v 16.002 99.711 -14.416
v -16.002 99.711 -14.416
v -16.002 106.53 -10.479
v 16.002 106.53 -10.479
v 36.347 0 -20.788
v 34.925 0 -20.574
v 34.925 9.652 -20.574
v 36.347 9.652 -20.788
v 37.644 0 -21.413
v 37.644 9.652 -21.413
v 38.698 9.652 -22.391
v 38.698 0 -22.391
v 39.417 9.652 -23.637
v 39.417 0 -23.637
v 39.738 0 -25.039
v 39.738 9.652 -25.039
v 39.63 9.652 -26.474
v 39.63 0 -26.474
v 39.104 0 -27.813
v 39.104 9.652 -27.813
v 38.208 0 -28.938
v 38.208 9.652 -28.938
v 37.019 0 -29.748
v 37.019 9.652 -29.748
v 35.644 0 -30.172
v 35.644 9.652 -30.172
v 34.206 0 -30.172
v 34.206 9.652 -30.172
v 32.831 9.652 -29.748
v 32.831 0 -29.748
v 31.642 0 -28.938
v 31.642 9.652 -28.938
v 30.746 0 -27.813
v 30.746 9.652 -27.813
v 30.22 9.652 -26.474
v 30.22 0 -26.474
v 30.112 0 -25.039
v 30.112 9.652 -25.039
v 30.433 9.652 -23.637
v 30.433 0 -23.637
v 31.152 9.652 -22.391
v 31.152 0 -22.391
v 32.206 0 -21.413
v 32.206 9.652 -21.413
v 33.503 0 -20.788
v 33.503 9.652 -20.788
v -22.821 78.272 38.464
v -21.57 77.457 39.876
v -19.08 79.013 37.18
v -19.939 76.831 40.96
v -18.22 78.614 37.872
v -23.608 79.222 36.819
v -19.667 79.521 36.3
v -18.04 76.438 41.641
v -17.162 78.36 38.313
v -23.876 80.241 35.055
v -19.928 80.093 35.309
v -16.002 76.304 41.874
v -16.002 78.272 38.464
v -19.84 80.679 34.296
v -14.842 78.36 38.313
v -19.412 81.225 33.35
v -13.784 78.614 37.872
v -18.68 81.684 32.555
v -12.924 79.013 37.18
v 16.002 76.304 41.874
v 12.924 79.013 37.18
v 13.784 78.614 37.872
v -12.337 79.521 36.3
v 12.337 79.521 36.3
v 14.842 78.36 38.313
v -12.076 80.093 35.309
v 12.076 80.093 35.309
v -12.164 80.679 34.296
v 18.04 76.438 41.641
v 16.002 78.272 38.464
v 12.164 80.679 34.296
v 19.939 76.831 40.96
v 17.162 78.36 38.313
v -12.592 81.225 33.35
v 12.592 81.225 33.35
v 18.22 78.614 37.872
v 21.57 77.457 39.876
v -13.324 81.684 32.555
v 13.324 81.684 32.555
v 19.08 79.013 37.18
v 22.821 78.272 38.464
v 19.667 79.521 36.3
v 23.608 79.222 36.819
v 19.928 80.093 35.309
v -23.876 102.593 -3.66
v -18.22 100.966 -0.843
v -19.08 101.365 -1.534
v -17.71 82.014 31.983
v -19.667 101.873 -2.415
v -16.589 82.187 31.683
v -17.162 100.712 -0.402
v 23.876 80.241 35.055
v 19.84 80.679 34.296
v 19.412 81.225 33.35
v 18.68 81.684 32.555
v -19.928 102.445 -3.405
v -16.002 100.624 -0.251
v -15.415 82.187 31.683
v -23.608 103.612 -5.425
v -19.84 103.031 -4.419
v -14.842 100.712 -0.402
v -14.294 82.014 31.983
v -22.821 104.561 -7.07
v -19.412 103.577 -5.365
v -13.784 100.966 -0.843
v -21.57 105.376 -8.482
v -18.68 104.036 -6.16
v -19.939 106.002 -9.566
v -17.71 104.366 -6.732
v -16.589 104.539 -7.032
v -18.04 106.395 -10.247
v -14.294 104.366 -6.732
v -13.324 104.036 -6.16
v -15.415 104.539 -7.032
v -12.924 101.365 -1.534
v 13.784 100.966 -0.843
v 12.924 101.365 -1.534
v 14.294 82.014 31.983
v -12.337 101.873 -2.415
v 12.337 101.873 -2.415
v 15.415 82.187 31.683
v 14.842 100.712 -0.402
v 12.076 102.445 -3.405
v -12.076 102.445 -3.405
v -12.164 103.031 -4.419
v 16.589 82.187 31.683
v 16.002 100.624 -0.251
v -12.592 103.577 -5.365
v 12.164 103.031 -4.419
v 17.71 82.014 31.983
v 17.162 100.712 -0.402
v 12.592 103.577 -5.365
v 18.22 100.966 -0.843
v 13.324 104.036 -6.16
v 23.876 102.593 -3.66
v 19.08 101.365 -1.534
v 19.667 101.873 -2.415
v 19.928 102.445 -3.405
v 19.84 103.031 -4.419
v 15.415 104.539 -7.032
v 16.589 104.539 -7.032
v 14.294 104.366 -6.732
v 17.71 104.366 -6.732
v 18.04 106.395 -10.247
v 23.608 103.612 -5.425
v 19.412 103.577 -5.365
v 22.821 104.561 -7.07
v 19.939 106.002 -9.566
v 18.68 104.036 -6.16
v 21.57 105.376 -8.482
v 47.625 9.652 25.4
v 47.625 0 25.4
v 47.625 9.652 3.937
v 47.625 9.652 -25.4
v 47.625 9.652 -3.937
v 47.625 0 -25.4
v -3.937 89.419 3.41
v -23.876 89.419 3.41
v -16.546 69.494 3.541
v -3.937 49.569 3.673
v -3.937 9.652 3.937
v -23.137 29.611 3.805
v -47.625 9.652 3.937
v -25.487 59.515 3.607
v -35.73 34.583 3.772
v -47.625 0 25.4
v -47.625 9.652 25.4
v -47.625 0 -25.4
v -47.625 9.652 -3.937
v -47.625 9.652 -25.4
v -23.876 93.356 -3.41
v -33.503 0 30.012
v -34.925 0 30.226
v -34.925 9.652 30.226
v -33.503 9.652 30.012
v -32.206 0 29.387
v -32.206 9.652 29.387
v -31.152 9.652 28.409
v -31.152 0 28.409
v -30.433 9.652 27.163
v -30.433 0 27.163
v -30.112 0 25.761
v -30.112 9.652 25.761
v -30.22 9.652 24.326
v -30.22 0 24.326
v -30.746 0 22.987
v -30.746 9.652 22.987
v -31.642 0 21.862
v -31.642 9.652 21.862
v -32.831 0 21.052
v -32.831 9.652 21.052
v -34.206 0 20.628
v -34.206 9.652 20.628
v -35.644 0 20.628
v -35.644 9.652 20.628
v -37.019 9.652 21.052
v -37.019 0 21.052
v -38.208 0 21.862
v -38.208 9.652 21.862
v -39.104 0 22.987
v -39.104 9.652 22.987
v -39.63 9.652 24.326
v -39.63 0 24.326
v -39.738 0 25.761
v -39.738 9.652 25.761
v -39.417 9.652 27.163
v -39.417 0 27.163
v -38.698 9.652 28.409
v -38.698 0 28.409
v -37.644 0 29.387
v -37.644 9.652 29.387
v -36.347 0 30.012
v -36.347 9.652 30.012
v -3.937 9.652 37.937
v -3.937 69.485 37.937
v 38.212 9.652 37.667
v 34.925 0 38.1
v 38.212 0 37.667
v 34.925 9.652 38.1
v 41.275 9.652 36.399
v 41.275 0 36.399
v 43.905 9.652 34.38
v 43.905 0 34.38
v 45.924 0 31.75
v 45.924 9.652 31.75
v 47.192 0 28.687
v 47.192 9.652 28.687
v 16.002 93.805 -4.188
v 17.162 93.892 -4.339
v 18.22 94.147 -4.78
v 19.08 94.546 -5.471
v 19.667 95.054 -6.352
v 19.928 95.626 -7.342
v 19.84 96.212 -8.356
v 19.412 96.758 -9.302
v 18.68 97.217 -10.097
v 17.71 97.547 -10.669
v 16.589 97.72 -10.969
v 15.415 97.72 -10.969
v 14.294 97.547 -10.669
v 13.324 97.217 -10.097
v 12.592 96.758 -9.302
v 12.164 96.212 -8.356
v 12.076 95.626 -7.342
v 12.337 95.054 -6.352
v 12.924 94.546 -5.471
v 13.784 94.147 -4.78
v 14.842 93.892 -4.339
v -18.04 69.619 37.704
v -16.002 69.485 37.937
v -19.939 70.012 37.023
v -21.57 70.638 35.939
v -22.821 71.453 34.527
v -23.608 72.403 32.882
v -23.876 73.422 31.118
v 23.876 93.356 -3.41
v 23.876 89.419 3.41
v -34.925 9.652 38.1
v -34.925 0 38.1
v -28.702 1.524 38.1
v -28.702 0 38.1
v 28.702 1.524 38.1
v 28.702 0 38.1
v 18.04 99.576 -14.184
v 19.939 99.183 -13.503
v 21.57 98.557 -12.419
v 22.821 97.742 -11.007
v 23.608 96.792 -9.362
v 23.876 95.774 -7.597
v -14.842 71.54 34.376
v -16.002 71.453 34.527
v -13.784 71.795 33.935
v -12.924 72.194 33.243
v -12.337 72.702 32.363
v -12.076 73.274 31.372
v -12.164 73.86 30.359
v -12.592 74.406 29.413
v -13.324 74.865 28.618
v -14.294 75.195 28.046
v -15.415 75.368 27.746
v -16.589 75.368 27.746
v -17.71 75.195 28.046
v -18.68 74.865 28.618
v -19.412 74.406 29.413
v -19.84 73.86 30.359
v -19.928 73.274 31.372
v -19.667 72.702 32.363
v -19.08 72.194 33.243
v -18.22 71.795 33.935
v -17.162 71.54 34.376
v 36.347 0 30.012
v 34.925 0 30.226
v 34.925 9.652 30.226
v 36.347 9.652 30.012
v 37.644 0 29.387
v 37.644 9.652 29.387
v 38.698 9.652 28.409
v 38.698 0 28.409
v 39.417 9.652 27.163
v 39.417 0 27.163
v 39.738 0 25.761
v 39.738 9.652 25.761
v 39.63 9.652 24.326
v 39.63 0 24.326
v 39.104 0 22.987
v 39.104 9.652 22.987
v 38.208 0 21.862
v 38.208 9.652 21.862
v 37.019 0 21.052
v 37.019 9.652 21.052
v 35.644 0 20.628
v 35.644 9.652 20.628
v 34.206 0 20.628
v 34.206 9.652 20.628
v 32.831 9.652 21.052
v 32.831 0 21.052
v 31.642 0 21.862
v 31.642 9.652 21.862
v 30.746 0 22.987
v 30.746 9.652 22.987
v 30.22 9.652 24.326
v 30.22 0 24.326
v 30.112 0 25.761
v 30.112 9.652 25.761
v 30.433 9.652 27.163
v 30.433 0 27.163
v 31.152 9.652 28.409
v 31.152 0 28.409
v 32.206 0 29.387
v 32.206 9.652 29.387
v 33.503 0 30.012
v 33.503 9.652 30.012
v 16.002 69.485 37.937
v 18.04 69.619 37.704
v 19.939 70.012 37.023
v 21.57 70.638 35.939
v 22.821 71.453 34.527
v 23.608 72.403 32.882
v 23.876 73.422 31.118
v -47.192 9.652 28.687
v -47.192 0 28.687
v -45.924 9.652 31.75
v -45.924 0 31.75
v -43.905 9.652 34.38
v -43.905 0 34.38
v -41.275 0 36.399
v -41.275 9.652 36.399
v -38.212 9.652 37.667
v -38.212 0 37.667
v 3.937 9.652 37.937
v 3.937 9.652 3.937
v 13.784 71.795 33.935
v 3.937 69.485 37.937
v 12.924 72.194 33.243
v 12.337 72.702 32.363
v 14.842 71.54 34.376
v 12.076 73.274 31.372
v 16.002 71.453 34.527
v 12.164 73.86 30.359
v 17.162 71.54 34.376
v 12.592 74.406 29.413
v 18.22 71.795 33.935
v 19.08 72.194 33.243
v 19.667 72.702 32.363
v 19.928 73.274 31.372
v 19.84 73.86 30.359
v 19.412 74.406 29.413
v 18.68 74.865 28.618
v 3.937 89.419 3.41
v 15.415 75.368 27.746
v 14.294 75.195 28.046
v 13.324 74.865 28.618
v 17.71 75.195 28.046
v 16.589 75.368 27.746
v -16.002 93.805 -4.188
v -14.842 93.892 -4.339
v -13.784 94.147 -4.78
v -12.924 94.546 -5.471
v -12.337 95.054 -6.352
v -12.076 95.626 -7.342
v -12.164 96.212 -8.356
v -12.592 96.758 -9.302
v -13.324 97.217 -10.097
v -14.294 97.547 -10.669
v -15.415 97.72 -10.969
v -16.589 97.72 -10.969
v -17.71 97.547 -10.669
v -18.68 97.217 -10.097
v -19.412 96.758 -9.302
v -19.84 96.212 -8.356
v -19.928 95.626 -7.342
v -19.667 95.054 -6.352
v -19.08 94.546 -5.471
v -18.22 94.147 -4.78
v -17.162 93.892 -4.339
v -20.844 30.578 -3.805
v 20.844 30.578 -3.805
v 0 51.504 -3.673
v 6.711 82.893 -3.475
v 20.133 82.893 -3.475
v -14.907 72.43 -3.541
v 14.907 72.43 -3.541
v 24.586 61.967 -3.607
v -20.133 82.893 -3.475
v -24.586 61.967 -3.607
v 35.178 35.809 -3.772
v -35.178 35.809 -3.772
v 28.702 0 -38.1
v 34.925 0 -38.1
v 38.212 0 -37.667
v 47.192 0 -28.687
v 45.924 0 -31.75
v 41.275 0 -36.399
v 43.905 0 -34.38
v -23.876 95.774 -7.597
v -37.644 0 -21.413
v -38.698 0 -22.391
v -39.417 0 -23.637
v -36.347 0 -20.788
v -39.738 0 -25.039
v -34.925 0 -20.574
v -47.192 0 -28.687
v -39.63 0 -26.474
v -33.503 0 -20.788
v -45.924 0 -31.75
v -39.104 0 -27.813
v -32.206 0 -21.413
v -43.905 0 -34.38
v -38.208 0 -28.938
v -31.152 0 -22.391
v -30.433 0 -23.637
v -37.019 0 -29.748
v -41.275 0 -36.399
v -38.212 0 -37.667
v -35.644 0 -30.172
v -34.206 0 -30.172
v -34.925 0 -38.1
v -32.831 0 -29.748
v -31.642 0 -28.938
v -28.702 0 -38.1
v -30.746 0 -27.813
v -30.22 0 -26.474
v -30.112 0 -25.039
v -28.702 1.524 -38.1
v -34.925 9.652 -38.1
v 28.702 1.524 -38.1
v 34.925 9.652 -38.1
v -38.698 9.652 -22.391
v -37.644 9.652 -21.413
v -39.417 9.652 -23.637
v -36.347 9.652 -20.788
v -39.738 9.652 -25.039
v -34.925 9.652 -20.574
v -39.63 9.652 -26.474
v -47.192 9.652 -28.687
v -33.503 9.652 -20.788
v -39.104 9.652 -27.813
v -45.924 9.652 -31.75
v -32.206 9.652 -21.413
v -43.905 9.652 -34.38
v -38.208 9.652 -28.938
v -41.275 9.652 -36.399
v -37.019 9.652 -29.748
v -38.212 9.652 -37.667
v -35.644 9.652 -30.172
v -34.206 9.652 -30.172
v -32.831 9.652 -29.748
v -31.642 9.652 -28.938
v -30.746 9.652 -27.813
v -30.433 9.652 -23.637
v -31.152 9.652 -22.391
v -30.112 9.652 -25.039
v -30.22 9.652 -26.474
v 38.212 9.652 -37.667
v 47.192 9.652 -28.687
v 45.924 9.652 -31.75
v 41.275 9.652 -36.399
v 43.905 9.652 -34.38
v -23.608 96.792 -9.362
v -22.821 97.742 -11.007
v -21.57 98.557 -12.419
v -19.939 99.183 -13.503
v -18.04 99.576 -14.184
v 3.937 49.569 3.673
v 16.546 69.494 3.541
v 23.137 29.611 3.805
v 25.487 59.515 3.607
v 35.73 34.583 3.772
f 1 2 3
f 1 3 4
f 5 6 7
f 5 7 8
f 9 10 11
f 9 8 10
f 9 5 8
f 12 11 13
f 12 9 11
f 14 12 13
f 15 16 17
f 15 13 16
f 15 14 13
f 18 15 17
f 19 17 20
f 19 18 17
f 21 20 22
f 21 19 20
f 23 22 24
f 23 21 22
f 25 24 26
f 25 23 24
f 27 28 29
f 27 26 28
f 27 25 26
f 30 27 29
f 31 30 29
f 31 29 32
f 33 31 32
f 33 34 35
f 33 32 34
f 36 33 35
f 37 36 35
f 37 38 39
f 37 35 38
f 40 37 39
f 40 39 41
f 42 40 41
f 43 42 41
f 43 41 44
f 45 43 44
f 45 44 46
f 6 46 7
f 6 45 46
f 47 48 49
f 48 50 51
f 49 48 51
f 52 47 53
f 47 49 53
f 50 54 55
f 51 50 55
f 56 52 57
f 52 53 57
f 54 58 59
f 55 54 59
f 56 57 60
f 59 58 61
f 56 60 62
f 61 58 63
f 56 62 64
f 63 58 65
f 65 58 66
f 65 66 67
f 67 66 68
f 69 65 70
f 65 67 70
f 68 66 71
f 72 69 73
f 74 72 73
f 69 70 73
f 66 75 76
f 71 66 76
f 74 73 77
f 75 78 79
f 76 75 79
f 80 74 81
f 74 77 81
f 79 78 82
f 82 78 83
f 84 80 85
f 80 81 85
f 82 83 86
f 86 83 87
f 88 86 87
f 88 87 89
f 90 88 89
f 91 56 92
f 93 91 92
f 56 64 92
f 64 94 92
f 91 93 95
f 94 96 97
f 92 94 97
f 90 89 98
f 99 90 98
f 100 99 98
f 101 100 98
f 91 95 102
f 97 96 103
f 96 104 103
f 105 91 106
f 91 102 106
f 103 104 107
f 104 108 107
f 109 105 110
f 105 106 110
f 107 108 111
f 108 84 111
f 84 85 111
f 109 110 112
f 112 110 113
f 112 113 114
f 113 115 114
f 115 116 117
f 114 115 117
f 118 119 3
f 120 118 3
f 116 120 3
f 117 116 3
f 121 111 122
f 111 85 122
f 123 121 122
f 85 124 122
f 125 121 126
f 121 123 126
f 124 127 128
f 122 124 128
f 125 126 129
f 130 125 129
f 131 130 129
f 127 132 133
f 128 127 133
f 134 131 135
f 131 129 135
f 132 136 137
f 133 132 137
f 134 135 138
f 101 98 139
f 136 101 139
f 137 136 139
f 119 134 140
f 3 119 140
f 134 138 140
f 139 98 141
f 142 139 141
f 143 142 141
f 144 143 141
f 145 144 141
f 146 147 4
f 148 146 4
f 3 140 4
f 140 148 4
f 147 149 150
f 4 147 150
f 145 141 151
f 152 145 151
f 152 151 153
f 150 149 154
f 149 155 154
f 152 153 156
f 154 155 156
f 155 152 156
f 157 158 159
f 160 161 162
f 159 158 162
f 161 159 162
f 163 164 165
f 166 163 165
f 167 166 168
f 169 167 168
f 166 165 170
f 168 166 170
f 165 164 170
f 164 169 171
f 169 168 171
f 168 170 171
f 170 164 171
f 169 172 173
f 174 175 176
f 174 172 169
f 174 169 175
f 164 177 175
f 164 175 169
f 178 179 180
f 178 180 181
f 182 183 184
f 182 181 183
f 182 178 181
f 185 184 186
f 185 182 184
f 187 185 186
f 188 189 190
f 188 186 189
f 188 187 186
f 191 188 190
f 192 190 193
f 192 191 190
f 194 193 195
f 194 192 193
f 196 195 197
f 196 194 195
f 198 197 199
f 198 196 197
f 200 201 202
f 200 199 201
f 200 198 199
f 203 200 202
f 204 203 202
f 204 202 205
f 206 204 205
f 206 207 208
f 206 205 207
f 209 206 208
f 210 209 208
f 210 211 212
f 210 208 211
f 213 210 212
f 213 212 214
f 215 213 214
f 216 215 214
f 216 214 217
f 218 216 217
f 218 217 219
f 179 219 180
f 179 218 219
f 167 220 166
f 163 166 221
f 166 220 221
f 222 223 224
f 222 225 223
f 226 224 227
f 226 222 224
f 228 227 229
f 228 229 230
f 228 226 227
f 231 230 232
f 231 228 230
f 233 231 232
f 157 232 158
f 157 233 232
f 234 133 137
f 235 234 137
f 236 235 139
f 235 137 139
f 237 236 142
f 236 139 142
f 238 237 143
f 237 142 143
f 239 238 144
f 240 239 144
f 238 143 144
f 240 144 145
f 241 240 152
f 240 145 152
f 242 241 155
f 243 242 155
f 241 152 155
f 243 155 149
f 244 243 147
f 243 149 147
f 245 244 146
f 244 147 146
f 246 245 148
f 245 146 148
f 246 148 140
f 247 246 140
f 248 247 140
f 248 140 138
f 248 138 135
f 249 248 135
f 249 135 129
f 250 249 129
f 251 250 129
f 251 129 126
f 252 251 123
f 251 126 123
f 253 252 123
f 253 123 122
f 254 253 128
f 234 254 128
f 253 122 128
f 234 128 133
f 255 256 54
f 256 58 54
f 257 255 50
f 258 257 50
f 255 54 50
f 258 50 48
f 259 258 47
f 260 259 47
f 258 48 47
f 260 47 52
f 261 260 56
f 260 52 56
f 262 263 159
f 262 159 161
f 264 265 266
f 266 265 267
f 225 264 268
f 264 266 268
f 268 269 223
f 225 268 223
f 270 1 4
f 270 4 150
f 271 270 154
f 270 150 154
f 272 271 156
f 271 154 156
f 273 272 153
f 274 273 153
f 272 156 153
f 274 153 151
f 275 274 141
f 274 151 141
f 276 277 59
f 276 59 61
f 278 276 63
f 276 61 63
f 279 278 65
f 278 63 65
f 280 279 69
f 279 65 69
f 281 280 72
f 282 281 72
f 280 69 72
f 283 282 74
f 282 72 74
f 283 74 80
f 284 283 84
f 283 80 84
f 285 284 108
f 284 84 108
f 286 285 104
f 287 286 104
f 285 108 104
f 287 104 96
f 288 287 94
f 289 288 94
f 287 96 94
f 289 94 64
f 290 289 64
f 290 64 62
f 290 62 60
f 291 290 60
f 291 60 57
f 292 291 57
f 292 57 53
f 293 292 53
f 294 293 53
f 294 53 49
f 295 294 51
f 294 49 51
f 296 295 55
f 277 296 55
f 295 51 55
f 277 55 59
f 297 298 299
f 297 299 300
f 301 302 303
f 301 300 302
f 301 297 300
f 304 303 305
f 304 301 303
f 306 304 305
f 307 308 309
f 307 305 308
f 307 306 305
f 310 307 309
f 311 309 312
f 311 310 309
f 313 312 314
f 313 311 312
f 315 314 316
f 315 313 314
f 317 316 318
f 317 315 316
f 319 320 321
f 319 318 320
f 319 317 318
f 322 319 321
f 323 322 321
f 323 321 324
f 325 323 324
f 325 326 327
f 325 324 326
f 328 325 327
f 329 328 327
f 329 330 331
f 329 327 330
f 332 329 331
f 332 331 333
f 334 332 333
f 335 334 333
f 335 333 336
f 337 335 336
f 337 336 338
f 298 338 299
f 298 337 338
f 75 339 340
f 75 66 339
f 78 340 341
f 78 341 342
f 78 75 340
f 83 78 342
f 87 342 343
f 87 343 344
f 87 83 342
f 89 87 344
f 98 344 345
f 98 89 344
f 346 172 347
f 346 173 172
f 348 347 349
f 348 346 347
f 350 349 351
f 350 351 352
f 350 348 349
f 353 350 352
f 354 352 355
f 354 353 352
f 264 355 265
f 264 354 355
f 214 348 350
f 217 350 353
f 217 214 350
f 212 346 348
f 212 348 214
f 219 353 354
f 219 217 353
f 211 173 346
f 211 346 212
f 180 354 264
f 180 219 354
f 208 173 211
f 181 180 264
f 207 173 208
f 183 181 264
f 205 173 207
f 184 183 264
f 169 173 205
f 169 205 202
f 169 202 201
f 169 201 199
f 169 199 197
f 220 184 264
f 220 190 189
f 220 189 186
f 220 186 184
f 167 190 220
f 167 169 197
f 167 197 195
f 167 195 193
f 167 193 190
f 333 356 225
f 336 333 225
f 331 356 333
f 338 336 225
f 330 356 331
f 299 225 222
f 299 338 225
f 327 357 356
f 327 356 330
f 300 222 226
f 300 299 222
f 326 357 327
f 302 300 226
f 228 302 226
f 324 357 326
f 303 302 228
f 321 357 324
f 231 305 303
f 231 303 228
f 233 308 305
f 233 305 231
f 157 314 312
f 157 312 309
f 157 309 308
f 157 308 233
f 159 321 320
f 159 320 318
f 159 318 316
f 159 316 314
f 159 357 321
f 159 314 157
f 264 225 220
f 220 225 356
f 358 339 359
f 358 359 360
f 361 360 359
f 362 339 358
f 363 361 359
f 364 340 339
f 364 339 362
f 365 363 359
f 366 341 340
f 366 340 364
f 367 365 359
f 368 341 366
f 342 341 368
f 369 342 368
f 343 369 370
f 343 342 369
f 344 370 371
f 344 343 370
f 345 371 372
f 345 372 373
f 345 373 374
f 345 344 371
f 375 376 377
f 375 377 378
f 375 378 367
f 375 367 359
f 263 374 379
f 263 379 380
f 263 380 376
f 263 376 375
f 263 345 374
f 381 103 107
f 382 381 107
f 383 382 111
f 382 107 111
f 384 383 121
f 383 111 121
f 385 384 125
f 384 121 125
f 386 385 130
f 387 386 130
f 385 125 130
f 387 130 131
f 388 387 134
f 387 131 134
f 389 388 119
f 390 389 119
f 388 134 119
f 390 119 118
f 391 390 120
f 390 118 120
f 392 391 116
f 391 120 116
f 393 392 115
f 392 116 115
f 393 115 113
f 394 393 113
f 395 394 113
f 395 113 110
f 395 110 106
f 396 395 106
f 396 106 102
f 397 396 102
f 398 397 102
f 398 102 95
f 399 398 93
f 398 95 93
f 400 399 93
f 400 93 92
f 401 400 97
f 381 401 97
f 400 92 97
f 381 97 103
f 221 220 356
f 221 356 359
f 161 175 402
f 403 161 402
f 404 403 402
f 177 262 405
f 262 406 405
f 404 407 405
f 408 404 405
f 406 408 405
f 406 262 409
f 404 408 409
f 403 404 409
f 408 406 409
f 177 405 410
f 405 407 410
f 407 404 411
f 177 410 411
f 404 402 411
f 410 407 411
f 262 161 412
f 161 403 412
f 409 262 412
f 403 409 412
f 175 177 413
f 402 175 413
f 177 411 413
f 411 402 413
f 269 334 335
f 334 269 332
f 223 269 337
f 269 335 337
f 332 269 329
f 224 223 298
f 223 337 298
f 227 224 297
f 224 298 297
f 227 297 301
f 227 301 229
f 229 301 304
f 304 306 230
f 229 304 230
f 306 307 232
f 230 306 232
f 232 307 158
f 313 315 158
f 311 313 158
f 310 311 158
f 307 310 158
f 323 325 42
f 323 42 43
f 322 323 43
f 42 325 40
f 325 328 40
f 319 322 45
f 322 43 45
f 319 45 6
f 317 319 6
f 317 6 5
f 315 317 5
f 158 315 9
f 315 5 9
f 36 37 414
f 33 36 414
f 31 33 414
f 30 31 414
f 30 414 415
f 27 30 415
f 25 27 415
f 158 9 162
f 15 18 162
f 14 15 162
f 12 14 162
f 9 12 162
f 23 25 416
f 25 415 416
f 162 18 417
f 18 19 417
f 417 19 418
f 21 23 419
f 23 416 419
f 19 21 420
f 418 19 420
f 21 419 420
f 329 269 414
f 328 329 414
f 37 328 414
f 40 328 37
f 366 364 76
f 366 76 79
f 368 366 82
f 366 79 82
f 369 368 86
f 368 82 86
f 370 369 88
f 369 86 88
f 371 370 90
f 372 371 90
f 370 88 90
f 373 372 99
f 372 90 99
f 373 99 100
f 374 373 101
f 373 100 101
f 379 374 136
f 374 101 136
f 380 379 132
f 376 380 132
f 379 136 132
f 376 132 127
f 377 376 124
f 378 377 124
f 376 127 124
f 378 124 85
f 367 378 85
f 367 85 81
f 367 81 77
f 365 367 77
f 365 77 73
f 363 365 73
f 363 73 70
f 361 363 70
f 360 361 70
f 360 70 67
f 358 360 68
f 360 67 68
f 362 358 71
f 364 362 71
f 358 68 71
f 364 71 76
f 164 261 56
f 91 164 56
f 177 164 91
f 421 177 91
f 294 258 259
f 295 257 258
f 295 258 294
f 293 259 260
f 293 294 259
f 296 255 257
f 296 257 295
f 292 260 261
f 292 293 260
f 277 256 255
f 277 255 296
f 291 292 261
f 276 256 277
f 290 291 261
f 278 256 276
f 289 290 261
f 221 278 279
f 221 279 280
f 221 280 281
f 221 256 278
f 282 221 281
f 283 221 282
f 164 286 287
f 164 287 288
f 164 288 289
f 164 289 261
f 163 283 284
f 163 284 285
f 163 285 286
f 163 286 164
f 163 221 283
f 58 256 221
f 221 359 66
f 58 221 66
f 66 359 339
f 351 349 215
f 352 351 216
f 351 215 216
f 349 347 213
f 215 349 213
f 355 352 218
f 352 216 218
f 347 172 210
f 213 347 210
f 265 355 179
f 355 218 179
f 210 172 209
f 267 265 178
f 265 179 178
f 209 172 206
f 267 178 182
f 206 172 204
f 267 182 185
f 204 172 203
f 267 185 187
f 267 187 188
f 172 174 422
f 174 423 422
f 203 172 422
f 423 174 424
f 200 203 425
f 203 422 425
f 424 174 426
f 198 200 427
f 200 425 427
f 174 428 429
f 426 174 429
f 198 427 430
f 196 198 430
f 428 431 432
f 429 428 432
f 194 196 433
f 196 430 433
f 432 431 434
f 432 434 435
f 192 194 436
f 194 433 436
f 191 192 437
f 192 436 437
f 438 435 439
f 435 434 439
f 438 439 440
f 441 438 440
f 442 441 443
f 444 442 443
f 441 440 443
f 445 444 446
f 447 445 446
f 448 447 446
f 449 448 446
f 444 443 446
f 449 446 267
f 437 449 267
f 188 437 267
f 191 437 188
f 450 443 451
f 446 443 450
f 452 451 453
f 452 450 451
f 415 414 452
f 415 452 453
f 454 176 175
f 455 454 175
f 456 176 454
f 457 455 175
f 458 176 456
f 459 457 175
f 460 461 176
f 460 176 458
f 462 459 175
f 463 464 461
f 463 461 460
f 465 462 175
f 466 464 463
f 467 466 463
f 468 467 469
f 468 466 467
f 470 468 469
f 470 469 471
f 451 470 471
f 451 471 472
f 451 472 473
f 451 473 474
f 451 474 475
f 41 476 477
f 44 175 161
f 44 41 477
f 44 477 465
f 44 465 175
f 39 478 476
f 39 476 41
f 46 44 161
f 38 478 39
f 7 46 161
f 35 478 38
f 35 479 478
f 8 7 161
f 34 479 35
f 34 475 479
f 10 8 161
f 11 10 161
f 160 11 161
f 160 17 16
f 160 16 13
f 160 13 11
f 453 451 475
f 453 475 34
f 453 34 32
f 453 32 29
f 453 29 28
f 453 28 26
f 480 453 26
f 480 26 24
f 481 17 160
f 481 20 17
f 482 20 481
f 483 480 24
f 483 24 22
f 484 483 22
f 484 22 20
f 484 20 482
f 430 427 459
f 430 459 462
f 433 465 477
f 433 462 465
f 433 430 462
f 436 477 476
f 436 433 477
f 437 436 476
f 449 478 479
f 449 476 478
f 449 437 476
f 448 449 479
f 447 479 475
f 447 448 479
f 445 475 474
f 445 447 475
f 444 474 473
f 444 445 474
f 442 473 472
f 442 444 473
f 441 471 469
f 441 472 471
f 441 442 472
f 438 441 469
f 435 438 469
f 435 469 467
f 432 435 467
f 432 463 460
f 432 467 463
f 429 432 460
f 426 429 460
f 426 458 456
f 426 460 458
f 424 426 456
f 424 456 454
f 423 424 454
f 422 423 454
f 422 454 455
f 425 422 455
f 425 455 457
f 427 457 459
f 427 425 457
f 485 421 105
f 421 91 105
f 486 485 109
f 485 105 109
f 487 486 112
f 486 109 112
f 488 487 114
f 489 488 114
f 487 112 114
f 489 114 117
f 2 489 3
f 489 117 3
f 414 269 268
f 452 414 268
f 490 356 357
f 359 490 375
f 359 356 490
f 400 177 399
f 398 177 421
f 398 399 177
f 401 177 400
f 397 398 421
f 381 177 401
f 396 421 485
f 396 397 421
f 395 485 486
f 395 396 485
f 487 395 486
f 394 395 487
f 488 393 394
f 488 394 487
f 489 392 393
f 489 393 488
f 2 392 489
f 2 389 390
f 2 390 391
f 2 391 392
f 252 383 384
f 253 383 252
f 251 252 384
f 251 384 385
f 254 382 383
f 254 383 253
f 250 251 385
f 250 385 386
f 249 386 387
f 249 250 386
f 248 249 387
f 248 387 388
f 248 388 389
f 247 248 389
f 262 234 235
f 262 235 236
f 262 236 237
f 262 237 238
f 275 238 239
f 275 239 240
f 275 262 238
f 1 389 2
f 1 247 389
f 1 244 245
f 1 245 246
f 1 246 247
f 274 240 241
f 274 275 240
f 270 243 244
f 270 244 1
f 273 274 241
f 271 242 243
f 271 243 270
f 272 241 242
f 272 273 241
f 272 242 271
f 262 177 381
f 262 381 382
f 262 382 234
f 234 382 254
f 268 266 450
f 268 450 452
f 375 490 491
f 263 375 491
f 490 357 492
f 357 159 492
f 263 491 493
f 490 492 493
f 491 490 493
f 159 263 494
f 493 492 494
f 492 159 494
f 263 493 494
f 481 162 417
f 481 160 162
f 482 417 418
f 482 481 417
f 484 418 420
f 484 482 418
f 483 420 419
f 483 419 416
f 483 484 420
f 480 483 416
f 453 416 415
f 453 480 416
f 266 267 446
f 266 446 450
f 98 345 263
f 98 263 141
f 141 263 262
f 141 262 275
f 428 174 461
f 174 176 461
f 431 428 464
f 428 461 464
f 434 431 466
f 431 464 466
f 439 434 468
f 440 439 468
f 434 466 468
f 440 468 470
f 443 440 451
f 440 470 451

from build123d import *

# Parameters (mm, degrees)
SKETCH1_W               = 95.25
SKETCH1_H               = 76.2
BOSS_EXTRUDE1_DEPTH     = 9.652
FILLET1_R               = 12.7
CUT_EXTRUDE1_DEPTH      = 62.74877917
CUT_EXTRUDE1_DEPTH_BACK = 62.74877917
SKETCH2_R               = 4.826
SKETCH3_W               = 57.404
SKETCH3_H               = 3.048
CUT_EXTRUDE2_DEPTH      = 91.375559356
SKETCH5_W               = 60.452
SKETCH5_H               = 47.752
BOSS_EXTRUDE2_DEPTH     = 7.874
FILLET2_R               = 7.874
SKETCH6_R               = 3.937
CUT_EXTRUDE3_DEPTH      = 7.874
RIB1_REACH              = 125.976
SKETCH10_WALL_W         = 309.953649084
SKETCH10_WALL_H         = 7.874


with BuildPart() as part:
    # Sketch1 → Boss-Extrude1 (new body)
    with BuildSketch(Plane(origin=(0, 0, 0), x_dir=(1, 0, 0), z_dir=(0, 1, 0))):
        Rectangle(SKETCH1_W, SKETCH1_H)
    extrude(amount=BOSS_EXTRUDE1_DEPTH)

    # Fillet1
    fillet1_edges = [part.edges().sort_by_distance(p)[0] for p in [
        (47.625, 4.826, 38.1),
        (-47.625, 4.826, 38.1),
        (-47.625, 4.826, -38.1),
        (47.625, 4.826, -38.1),
    ]]
    fillet(fillet1_edges, radius=FILLET1_R)

    # Sketch2 → Cut-Extrude1 (cut, two sides: drawn at the far end of the back side and taken through both)
    with BuildSketch(Plane(origin=(0, 9.652, 0), x_dir=(1, 0, 0), z_dir=(0, 1, 0)).offset(-CUT_EXTRUDE1_DEPTH_BACK)):
        with Locations(Location((-34.925, -25.4, 0), (0, 0, 270))):
            Circle(SKETCH2_R)
        with Locations(Location((-34.925, 25.4, 0), (0, 0, 270))):
            Circle(SKETCH2_R)
        with Locations(Location((34.925, 25.4, 0), (0, 0, 270))):
            Circle(SKETCH2_R)
        with Locations(Location((34.925, -25.4, 0), (0, 0, 270))):
            Circle(SKETCH2_R)
    extrude(amount=CUT_EXTRUDE1_DEPTH + CUT_EXTRUDE1_DEPTH_BACK, mode=Mode.SUBTRACT)

    # Sketch3 → Cut-Extrude2 (cut, through all)
    with BuildSketch(Plane.XY.offset(38.1)):
        Rectangle(SKETCH3_W, SKETCH3_H)
    extrude(amount=-CUT_EXTRUDE2_DEPTH, mode=Mode.SUBTRACT)



with BuildPart() as body_2:
    # Sketch5 → Boss-Extrude2 (new body)
    with BuildSketch(Plane(origin=(0, 68.540427062, 39.571834015), x_dir=(0, 0.4999999999999976, -0.86602540378444), z_dir=(0, -0.8660254037844402, -0.4999999999999977))):
        with Locations((32.114183863, 0)):
            Rectangle(SKETCH5_W, SKETCH5_H)
    extrude(amount=-BOSS_EXTRUDE2_DEPTH)

    # Fillet2
    fillet2_edges = [body_2.edges().sort_by_distance(p)[0] for p in [
        (-23.876, 103.120061008, -12.447848887),
        (-23.876, 72.894061008, 39.905118823),
        (23.876, 72.894061008, 39.905118823),
        (23.876, 103.120061008, -12.447848887),
    ]]
    fillet(fillet2_edges, radius=FILLET2_R)

    # Sketch6 → Cut-Extrude3 (cut)
    with BuildSketch(Plane(origin=(0, 75.359511091, 43.508834015), x_dir=(1, 0, 0), z_dir=(0, 0.86602540378444, 0.49999999999999784))):
        with Locations(Location((-16.002, 9.762183863, 0), (0, 0, 270))):
            Circle(SKETCH6_R)
        with Locations(Location((16.002, 9.762183863, 0), (0, 0, 270))):
            Circle(SKETCH6_R)
        with Locations(Location((16.002, 54.466183863, 0), (0, 0, 270))):
            Circle(SKETCH6_R)
        with Locations(Location((-16.002, 54.466183863, 0), (0, 0, 270))):
            Circle(SKETCH6_R)
    extrude(amount=-CUT_EXTRUDE3_DEPTH, mode=Mode.SUBTRACT)


with BuildPart() as part_1:
    add(part.part)

    add(body_2.part)  # Loft1 merges body 2
    # Sketch9 → Loft1 section 0
    with BuildSketch(Plane(origin=(0, 68.540427062, 39.571834015), x_dir=(1, 0, 0), z_dir=(0, -0.86602540378444, -0.49999999999999784))):
        with BuildLine():
            Line((23.876, -49.630618041), (-23.876, -49.630618041))
            Line((-23.876, -49.630618041), (-23.876, -41.756618041))
            Line((-23.876, -41.756618041), (23.876, -41.756618041))
            Line((23.876, -41.756618041), (23.876, -49.630618041))
        make_face()
    # Sketch7 → Loft1 section 1
    with BuildSketch(Plane(origin=(0, 9.652, 0), x_dir=(1, 0, 0), z_dir=(0, 1, 0))):
        with BuildLine():
            Line((-47.625, -3.937), (47.625, -3.937))
            Line((47.625, -3.937), (47.625, 3.937))
            Line((47.625, 3.937), (-47.625, 3.937))
            Line((-47.625, 3.937), (-47.625, -3.937))
        make_face()
    loft()

    # Sketch10 wall → Rib1 (add, up to next)
    with BuildSketch(Plane(origin=(0, 39.483889376, 37.936618823), x_dir=(0, 1, 0), z_dir=(0, 0, 1)), mode=Mode.PRIVATE) as rib1_sk1:
        Rectangle(SKETCH10_WALL_W, SKETCH10_WALL_H)
    rib1_tool1 = extrude(rib1_sk1.sketch, amount=-RIB1_REACH, mode=Mode.PRIVATE) - part_1.part
    add(rib1_tool1.solids().sort_by_distance((0, 39.483889376, 37.936618823))[0])


solid = part_1.part
